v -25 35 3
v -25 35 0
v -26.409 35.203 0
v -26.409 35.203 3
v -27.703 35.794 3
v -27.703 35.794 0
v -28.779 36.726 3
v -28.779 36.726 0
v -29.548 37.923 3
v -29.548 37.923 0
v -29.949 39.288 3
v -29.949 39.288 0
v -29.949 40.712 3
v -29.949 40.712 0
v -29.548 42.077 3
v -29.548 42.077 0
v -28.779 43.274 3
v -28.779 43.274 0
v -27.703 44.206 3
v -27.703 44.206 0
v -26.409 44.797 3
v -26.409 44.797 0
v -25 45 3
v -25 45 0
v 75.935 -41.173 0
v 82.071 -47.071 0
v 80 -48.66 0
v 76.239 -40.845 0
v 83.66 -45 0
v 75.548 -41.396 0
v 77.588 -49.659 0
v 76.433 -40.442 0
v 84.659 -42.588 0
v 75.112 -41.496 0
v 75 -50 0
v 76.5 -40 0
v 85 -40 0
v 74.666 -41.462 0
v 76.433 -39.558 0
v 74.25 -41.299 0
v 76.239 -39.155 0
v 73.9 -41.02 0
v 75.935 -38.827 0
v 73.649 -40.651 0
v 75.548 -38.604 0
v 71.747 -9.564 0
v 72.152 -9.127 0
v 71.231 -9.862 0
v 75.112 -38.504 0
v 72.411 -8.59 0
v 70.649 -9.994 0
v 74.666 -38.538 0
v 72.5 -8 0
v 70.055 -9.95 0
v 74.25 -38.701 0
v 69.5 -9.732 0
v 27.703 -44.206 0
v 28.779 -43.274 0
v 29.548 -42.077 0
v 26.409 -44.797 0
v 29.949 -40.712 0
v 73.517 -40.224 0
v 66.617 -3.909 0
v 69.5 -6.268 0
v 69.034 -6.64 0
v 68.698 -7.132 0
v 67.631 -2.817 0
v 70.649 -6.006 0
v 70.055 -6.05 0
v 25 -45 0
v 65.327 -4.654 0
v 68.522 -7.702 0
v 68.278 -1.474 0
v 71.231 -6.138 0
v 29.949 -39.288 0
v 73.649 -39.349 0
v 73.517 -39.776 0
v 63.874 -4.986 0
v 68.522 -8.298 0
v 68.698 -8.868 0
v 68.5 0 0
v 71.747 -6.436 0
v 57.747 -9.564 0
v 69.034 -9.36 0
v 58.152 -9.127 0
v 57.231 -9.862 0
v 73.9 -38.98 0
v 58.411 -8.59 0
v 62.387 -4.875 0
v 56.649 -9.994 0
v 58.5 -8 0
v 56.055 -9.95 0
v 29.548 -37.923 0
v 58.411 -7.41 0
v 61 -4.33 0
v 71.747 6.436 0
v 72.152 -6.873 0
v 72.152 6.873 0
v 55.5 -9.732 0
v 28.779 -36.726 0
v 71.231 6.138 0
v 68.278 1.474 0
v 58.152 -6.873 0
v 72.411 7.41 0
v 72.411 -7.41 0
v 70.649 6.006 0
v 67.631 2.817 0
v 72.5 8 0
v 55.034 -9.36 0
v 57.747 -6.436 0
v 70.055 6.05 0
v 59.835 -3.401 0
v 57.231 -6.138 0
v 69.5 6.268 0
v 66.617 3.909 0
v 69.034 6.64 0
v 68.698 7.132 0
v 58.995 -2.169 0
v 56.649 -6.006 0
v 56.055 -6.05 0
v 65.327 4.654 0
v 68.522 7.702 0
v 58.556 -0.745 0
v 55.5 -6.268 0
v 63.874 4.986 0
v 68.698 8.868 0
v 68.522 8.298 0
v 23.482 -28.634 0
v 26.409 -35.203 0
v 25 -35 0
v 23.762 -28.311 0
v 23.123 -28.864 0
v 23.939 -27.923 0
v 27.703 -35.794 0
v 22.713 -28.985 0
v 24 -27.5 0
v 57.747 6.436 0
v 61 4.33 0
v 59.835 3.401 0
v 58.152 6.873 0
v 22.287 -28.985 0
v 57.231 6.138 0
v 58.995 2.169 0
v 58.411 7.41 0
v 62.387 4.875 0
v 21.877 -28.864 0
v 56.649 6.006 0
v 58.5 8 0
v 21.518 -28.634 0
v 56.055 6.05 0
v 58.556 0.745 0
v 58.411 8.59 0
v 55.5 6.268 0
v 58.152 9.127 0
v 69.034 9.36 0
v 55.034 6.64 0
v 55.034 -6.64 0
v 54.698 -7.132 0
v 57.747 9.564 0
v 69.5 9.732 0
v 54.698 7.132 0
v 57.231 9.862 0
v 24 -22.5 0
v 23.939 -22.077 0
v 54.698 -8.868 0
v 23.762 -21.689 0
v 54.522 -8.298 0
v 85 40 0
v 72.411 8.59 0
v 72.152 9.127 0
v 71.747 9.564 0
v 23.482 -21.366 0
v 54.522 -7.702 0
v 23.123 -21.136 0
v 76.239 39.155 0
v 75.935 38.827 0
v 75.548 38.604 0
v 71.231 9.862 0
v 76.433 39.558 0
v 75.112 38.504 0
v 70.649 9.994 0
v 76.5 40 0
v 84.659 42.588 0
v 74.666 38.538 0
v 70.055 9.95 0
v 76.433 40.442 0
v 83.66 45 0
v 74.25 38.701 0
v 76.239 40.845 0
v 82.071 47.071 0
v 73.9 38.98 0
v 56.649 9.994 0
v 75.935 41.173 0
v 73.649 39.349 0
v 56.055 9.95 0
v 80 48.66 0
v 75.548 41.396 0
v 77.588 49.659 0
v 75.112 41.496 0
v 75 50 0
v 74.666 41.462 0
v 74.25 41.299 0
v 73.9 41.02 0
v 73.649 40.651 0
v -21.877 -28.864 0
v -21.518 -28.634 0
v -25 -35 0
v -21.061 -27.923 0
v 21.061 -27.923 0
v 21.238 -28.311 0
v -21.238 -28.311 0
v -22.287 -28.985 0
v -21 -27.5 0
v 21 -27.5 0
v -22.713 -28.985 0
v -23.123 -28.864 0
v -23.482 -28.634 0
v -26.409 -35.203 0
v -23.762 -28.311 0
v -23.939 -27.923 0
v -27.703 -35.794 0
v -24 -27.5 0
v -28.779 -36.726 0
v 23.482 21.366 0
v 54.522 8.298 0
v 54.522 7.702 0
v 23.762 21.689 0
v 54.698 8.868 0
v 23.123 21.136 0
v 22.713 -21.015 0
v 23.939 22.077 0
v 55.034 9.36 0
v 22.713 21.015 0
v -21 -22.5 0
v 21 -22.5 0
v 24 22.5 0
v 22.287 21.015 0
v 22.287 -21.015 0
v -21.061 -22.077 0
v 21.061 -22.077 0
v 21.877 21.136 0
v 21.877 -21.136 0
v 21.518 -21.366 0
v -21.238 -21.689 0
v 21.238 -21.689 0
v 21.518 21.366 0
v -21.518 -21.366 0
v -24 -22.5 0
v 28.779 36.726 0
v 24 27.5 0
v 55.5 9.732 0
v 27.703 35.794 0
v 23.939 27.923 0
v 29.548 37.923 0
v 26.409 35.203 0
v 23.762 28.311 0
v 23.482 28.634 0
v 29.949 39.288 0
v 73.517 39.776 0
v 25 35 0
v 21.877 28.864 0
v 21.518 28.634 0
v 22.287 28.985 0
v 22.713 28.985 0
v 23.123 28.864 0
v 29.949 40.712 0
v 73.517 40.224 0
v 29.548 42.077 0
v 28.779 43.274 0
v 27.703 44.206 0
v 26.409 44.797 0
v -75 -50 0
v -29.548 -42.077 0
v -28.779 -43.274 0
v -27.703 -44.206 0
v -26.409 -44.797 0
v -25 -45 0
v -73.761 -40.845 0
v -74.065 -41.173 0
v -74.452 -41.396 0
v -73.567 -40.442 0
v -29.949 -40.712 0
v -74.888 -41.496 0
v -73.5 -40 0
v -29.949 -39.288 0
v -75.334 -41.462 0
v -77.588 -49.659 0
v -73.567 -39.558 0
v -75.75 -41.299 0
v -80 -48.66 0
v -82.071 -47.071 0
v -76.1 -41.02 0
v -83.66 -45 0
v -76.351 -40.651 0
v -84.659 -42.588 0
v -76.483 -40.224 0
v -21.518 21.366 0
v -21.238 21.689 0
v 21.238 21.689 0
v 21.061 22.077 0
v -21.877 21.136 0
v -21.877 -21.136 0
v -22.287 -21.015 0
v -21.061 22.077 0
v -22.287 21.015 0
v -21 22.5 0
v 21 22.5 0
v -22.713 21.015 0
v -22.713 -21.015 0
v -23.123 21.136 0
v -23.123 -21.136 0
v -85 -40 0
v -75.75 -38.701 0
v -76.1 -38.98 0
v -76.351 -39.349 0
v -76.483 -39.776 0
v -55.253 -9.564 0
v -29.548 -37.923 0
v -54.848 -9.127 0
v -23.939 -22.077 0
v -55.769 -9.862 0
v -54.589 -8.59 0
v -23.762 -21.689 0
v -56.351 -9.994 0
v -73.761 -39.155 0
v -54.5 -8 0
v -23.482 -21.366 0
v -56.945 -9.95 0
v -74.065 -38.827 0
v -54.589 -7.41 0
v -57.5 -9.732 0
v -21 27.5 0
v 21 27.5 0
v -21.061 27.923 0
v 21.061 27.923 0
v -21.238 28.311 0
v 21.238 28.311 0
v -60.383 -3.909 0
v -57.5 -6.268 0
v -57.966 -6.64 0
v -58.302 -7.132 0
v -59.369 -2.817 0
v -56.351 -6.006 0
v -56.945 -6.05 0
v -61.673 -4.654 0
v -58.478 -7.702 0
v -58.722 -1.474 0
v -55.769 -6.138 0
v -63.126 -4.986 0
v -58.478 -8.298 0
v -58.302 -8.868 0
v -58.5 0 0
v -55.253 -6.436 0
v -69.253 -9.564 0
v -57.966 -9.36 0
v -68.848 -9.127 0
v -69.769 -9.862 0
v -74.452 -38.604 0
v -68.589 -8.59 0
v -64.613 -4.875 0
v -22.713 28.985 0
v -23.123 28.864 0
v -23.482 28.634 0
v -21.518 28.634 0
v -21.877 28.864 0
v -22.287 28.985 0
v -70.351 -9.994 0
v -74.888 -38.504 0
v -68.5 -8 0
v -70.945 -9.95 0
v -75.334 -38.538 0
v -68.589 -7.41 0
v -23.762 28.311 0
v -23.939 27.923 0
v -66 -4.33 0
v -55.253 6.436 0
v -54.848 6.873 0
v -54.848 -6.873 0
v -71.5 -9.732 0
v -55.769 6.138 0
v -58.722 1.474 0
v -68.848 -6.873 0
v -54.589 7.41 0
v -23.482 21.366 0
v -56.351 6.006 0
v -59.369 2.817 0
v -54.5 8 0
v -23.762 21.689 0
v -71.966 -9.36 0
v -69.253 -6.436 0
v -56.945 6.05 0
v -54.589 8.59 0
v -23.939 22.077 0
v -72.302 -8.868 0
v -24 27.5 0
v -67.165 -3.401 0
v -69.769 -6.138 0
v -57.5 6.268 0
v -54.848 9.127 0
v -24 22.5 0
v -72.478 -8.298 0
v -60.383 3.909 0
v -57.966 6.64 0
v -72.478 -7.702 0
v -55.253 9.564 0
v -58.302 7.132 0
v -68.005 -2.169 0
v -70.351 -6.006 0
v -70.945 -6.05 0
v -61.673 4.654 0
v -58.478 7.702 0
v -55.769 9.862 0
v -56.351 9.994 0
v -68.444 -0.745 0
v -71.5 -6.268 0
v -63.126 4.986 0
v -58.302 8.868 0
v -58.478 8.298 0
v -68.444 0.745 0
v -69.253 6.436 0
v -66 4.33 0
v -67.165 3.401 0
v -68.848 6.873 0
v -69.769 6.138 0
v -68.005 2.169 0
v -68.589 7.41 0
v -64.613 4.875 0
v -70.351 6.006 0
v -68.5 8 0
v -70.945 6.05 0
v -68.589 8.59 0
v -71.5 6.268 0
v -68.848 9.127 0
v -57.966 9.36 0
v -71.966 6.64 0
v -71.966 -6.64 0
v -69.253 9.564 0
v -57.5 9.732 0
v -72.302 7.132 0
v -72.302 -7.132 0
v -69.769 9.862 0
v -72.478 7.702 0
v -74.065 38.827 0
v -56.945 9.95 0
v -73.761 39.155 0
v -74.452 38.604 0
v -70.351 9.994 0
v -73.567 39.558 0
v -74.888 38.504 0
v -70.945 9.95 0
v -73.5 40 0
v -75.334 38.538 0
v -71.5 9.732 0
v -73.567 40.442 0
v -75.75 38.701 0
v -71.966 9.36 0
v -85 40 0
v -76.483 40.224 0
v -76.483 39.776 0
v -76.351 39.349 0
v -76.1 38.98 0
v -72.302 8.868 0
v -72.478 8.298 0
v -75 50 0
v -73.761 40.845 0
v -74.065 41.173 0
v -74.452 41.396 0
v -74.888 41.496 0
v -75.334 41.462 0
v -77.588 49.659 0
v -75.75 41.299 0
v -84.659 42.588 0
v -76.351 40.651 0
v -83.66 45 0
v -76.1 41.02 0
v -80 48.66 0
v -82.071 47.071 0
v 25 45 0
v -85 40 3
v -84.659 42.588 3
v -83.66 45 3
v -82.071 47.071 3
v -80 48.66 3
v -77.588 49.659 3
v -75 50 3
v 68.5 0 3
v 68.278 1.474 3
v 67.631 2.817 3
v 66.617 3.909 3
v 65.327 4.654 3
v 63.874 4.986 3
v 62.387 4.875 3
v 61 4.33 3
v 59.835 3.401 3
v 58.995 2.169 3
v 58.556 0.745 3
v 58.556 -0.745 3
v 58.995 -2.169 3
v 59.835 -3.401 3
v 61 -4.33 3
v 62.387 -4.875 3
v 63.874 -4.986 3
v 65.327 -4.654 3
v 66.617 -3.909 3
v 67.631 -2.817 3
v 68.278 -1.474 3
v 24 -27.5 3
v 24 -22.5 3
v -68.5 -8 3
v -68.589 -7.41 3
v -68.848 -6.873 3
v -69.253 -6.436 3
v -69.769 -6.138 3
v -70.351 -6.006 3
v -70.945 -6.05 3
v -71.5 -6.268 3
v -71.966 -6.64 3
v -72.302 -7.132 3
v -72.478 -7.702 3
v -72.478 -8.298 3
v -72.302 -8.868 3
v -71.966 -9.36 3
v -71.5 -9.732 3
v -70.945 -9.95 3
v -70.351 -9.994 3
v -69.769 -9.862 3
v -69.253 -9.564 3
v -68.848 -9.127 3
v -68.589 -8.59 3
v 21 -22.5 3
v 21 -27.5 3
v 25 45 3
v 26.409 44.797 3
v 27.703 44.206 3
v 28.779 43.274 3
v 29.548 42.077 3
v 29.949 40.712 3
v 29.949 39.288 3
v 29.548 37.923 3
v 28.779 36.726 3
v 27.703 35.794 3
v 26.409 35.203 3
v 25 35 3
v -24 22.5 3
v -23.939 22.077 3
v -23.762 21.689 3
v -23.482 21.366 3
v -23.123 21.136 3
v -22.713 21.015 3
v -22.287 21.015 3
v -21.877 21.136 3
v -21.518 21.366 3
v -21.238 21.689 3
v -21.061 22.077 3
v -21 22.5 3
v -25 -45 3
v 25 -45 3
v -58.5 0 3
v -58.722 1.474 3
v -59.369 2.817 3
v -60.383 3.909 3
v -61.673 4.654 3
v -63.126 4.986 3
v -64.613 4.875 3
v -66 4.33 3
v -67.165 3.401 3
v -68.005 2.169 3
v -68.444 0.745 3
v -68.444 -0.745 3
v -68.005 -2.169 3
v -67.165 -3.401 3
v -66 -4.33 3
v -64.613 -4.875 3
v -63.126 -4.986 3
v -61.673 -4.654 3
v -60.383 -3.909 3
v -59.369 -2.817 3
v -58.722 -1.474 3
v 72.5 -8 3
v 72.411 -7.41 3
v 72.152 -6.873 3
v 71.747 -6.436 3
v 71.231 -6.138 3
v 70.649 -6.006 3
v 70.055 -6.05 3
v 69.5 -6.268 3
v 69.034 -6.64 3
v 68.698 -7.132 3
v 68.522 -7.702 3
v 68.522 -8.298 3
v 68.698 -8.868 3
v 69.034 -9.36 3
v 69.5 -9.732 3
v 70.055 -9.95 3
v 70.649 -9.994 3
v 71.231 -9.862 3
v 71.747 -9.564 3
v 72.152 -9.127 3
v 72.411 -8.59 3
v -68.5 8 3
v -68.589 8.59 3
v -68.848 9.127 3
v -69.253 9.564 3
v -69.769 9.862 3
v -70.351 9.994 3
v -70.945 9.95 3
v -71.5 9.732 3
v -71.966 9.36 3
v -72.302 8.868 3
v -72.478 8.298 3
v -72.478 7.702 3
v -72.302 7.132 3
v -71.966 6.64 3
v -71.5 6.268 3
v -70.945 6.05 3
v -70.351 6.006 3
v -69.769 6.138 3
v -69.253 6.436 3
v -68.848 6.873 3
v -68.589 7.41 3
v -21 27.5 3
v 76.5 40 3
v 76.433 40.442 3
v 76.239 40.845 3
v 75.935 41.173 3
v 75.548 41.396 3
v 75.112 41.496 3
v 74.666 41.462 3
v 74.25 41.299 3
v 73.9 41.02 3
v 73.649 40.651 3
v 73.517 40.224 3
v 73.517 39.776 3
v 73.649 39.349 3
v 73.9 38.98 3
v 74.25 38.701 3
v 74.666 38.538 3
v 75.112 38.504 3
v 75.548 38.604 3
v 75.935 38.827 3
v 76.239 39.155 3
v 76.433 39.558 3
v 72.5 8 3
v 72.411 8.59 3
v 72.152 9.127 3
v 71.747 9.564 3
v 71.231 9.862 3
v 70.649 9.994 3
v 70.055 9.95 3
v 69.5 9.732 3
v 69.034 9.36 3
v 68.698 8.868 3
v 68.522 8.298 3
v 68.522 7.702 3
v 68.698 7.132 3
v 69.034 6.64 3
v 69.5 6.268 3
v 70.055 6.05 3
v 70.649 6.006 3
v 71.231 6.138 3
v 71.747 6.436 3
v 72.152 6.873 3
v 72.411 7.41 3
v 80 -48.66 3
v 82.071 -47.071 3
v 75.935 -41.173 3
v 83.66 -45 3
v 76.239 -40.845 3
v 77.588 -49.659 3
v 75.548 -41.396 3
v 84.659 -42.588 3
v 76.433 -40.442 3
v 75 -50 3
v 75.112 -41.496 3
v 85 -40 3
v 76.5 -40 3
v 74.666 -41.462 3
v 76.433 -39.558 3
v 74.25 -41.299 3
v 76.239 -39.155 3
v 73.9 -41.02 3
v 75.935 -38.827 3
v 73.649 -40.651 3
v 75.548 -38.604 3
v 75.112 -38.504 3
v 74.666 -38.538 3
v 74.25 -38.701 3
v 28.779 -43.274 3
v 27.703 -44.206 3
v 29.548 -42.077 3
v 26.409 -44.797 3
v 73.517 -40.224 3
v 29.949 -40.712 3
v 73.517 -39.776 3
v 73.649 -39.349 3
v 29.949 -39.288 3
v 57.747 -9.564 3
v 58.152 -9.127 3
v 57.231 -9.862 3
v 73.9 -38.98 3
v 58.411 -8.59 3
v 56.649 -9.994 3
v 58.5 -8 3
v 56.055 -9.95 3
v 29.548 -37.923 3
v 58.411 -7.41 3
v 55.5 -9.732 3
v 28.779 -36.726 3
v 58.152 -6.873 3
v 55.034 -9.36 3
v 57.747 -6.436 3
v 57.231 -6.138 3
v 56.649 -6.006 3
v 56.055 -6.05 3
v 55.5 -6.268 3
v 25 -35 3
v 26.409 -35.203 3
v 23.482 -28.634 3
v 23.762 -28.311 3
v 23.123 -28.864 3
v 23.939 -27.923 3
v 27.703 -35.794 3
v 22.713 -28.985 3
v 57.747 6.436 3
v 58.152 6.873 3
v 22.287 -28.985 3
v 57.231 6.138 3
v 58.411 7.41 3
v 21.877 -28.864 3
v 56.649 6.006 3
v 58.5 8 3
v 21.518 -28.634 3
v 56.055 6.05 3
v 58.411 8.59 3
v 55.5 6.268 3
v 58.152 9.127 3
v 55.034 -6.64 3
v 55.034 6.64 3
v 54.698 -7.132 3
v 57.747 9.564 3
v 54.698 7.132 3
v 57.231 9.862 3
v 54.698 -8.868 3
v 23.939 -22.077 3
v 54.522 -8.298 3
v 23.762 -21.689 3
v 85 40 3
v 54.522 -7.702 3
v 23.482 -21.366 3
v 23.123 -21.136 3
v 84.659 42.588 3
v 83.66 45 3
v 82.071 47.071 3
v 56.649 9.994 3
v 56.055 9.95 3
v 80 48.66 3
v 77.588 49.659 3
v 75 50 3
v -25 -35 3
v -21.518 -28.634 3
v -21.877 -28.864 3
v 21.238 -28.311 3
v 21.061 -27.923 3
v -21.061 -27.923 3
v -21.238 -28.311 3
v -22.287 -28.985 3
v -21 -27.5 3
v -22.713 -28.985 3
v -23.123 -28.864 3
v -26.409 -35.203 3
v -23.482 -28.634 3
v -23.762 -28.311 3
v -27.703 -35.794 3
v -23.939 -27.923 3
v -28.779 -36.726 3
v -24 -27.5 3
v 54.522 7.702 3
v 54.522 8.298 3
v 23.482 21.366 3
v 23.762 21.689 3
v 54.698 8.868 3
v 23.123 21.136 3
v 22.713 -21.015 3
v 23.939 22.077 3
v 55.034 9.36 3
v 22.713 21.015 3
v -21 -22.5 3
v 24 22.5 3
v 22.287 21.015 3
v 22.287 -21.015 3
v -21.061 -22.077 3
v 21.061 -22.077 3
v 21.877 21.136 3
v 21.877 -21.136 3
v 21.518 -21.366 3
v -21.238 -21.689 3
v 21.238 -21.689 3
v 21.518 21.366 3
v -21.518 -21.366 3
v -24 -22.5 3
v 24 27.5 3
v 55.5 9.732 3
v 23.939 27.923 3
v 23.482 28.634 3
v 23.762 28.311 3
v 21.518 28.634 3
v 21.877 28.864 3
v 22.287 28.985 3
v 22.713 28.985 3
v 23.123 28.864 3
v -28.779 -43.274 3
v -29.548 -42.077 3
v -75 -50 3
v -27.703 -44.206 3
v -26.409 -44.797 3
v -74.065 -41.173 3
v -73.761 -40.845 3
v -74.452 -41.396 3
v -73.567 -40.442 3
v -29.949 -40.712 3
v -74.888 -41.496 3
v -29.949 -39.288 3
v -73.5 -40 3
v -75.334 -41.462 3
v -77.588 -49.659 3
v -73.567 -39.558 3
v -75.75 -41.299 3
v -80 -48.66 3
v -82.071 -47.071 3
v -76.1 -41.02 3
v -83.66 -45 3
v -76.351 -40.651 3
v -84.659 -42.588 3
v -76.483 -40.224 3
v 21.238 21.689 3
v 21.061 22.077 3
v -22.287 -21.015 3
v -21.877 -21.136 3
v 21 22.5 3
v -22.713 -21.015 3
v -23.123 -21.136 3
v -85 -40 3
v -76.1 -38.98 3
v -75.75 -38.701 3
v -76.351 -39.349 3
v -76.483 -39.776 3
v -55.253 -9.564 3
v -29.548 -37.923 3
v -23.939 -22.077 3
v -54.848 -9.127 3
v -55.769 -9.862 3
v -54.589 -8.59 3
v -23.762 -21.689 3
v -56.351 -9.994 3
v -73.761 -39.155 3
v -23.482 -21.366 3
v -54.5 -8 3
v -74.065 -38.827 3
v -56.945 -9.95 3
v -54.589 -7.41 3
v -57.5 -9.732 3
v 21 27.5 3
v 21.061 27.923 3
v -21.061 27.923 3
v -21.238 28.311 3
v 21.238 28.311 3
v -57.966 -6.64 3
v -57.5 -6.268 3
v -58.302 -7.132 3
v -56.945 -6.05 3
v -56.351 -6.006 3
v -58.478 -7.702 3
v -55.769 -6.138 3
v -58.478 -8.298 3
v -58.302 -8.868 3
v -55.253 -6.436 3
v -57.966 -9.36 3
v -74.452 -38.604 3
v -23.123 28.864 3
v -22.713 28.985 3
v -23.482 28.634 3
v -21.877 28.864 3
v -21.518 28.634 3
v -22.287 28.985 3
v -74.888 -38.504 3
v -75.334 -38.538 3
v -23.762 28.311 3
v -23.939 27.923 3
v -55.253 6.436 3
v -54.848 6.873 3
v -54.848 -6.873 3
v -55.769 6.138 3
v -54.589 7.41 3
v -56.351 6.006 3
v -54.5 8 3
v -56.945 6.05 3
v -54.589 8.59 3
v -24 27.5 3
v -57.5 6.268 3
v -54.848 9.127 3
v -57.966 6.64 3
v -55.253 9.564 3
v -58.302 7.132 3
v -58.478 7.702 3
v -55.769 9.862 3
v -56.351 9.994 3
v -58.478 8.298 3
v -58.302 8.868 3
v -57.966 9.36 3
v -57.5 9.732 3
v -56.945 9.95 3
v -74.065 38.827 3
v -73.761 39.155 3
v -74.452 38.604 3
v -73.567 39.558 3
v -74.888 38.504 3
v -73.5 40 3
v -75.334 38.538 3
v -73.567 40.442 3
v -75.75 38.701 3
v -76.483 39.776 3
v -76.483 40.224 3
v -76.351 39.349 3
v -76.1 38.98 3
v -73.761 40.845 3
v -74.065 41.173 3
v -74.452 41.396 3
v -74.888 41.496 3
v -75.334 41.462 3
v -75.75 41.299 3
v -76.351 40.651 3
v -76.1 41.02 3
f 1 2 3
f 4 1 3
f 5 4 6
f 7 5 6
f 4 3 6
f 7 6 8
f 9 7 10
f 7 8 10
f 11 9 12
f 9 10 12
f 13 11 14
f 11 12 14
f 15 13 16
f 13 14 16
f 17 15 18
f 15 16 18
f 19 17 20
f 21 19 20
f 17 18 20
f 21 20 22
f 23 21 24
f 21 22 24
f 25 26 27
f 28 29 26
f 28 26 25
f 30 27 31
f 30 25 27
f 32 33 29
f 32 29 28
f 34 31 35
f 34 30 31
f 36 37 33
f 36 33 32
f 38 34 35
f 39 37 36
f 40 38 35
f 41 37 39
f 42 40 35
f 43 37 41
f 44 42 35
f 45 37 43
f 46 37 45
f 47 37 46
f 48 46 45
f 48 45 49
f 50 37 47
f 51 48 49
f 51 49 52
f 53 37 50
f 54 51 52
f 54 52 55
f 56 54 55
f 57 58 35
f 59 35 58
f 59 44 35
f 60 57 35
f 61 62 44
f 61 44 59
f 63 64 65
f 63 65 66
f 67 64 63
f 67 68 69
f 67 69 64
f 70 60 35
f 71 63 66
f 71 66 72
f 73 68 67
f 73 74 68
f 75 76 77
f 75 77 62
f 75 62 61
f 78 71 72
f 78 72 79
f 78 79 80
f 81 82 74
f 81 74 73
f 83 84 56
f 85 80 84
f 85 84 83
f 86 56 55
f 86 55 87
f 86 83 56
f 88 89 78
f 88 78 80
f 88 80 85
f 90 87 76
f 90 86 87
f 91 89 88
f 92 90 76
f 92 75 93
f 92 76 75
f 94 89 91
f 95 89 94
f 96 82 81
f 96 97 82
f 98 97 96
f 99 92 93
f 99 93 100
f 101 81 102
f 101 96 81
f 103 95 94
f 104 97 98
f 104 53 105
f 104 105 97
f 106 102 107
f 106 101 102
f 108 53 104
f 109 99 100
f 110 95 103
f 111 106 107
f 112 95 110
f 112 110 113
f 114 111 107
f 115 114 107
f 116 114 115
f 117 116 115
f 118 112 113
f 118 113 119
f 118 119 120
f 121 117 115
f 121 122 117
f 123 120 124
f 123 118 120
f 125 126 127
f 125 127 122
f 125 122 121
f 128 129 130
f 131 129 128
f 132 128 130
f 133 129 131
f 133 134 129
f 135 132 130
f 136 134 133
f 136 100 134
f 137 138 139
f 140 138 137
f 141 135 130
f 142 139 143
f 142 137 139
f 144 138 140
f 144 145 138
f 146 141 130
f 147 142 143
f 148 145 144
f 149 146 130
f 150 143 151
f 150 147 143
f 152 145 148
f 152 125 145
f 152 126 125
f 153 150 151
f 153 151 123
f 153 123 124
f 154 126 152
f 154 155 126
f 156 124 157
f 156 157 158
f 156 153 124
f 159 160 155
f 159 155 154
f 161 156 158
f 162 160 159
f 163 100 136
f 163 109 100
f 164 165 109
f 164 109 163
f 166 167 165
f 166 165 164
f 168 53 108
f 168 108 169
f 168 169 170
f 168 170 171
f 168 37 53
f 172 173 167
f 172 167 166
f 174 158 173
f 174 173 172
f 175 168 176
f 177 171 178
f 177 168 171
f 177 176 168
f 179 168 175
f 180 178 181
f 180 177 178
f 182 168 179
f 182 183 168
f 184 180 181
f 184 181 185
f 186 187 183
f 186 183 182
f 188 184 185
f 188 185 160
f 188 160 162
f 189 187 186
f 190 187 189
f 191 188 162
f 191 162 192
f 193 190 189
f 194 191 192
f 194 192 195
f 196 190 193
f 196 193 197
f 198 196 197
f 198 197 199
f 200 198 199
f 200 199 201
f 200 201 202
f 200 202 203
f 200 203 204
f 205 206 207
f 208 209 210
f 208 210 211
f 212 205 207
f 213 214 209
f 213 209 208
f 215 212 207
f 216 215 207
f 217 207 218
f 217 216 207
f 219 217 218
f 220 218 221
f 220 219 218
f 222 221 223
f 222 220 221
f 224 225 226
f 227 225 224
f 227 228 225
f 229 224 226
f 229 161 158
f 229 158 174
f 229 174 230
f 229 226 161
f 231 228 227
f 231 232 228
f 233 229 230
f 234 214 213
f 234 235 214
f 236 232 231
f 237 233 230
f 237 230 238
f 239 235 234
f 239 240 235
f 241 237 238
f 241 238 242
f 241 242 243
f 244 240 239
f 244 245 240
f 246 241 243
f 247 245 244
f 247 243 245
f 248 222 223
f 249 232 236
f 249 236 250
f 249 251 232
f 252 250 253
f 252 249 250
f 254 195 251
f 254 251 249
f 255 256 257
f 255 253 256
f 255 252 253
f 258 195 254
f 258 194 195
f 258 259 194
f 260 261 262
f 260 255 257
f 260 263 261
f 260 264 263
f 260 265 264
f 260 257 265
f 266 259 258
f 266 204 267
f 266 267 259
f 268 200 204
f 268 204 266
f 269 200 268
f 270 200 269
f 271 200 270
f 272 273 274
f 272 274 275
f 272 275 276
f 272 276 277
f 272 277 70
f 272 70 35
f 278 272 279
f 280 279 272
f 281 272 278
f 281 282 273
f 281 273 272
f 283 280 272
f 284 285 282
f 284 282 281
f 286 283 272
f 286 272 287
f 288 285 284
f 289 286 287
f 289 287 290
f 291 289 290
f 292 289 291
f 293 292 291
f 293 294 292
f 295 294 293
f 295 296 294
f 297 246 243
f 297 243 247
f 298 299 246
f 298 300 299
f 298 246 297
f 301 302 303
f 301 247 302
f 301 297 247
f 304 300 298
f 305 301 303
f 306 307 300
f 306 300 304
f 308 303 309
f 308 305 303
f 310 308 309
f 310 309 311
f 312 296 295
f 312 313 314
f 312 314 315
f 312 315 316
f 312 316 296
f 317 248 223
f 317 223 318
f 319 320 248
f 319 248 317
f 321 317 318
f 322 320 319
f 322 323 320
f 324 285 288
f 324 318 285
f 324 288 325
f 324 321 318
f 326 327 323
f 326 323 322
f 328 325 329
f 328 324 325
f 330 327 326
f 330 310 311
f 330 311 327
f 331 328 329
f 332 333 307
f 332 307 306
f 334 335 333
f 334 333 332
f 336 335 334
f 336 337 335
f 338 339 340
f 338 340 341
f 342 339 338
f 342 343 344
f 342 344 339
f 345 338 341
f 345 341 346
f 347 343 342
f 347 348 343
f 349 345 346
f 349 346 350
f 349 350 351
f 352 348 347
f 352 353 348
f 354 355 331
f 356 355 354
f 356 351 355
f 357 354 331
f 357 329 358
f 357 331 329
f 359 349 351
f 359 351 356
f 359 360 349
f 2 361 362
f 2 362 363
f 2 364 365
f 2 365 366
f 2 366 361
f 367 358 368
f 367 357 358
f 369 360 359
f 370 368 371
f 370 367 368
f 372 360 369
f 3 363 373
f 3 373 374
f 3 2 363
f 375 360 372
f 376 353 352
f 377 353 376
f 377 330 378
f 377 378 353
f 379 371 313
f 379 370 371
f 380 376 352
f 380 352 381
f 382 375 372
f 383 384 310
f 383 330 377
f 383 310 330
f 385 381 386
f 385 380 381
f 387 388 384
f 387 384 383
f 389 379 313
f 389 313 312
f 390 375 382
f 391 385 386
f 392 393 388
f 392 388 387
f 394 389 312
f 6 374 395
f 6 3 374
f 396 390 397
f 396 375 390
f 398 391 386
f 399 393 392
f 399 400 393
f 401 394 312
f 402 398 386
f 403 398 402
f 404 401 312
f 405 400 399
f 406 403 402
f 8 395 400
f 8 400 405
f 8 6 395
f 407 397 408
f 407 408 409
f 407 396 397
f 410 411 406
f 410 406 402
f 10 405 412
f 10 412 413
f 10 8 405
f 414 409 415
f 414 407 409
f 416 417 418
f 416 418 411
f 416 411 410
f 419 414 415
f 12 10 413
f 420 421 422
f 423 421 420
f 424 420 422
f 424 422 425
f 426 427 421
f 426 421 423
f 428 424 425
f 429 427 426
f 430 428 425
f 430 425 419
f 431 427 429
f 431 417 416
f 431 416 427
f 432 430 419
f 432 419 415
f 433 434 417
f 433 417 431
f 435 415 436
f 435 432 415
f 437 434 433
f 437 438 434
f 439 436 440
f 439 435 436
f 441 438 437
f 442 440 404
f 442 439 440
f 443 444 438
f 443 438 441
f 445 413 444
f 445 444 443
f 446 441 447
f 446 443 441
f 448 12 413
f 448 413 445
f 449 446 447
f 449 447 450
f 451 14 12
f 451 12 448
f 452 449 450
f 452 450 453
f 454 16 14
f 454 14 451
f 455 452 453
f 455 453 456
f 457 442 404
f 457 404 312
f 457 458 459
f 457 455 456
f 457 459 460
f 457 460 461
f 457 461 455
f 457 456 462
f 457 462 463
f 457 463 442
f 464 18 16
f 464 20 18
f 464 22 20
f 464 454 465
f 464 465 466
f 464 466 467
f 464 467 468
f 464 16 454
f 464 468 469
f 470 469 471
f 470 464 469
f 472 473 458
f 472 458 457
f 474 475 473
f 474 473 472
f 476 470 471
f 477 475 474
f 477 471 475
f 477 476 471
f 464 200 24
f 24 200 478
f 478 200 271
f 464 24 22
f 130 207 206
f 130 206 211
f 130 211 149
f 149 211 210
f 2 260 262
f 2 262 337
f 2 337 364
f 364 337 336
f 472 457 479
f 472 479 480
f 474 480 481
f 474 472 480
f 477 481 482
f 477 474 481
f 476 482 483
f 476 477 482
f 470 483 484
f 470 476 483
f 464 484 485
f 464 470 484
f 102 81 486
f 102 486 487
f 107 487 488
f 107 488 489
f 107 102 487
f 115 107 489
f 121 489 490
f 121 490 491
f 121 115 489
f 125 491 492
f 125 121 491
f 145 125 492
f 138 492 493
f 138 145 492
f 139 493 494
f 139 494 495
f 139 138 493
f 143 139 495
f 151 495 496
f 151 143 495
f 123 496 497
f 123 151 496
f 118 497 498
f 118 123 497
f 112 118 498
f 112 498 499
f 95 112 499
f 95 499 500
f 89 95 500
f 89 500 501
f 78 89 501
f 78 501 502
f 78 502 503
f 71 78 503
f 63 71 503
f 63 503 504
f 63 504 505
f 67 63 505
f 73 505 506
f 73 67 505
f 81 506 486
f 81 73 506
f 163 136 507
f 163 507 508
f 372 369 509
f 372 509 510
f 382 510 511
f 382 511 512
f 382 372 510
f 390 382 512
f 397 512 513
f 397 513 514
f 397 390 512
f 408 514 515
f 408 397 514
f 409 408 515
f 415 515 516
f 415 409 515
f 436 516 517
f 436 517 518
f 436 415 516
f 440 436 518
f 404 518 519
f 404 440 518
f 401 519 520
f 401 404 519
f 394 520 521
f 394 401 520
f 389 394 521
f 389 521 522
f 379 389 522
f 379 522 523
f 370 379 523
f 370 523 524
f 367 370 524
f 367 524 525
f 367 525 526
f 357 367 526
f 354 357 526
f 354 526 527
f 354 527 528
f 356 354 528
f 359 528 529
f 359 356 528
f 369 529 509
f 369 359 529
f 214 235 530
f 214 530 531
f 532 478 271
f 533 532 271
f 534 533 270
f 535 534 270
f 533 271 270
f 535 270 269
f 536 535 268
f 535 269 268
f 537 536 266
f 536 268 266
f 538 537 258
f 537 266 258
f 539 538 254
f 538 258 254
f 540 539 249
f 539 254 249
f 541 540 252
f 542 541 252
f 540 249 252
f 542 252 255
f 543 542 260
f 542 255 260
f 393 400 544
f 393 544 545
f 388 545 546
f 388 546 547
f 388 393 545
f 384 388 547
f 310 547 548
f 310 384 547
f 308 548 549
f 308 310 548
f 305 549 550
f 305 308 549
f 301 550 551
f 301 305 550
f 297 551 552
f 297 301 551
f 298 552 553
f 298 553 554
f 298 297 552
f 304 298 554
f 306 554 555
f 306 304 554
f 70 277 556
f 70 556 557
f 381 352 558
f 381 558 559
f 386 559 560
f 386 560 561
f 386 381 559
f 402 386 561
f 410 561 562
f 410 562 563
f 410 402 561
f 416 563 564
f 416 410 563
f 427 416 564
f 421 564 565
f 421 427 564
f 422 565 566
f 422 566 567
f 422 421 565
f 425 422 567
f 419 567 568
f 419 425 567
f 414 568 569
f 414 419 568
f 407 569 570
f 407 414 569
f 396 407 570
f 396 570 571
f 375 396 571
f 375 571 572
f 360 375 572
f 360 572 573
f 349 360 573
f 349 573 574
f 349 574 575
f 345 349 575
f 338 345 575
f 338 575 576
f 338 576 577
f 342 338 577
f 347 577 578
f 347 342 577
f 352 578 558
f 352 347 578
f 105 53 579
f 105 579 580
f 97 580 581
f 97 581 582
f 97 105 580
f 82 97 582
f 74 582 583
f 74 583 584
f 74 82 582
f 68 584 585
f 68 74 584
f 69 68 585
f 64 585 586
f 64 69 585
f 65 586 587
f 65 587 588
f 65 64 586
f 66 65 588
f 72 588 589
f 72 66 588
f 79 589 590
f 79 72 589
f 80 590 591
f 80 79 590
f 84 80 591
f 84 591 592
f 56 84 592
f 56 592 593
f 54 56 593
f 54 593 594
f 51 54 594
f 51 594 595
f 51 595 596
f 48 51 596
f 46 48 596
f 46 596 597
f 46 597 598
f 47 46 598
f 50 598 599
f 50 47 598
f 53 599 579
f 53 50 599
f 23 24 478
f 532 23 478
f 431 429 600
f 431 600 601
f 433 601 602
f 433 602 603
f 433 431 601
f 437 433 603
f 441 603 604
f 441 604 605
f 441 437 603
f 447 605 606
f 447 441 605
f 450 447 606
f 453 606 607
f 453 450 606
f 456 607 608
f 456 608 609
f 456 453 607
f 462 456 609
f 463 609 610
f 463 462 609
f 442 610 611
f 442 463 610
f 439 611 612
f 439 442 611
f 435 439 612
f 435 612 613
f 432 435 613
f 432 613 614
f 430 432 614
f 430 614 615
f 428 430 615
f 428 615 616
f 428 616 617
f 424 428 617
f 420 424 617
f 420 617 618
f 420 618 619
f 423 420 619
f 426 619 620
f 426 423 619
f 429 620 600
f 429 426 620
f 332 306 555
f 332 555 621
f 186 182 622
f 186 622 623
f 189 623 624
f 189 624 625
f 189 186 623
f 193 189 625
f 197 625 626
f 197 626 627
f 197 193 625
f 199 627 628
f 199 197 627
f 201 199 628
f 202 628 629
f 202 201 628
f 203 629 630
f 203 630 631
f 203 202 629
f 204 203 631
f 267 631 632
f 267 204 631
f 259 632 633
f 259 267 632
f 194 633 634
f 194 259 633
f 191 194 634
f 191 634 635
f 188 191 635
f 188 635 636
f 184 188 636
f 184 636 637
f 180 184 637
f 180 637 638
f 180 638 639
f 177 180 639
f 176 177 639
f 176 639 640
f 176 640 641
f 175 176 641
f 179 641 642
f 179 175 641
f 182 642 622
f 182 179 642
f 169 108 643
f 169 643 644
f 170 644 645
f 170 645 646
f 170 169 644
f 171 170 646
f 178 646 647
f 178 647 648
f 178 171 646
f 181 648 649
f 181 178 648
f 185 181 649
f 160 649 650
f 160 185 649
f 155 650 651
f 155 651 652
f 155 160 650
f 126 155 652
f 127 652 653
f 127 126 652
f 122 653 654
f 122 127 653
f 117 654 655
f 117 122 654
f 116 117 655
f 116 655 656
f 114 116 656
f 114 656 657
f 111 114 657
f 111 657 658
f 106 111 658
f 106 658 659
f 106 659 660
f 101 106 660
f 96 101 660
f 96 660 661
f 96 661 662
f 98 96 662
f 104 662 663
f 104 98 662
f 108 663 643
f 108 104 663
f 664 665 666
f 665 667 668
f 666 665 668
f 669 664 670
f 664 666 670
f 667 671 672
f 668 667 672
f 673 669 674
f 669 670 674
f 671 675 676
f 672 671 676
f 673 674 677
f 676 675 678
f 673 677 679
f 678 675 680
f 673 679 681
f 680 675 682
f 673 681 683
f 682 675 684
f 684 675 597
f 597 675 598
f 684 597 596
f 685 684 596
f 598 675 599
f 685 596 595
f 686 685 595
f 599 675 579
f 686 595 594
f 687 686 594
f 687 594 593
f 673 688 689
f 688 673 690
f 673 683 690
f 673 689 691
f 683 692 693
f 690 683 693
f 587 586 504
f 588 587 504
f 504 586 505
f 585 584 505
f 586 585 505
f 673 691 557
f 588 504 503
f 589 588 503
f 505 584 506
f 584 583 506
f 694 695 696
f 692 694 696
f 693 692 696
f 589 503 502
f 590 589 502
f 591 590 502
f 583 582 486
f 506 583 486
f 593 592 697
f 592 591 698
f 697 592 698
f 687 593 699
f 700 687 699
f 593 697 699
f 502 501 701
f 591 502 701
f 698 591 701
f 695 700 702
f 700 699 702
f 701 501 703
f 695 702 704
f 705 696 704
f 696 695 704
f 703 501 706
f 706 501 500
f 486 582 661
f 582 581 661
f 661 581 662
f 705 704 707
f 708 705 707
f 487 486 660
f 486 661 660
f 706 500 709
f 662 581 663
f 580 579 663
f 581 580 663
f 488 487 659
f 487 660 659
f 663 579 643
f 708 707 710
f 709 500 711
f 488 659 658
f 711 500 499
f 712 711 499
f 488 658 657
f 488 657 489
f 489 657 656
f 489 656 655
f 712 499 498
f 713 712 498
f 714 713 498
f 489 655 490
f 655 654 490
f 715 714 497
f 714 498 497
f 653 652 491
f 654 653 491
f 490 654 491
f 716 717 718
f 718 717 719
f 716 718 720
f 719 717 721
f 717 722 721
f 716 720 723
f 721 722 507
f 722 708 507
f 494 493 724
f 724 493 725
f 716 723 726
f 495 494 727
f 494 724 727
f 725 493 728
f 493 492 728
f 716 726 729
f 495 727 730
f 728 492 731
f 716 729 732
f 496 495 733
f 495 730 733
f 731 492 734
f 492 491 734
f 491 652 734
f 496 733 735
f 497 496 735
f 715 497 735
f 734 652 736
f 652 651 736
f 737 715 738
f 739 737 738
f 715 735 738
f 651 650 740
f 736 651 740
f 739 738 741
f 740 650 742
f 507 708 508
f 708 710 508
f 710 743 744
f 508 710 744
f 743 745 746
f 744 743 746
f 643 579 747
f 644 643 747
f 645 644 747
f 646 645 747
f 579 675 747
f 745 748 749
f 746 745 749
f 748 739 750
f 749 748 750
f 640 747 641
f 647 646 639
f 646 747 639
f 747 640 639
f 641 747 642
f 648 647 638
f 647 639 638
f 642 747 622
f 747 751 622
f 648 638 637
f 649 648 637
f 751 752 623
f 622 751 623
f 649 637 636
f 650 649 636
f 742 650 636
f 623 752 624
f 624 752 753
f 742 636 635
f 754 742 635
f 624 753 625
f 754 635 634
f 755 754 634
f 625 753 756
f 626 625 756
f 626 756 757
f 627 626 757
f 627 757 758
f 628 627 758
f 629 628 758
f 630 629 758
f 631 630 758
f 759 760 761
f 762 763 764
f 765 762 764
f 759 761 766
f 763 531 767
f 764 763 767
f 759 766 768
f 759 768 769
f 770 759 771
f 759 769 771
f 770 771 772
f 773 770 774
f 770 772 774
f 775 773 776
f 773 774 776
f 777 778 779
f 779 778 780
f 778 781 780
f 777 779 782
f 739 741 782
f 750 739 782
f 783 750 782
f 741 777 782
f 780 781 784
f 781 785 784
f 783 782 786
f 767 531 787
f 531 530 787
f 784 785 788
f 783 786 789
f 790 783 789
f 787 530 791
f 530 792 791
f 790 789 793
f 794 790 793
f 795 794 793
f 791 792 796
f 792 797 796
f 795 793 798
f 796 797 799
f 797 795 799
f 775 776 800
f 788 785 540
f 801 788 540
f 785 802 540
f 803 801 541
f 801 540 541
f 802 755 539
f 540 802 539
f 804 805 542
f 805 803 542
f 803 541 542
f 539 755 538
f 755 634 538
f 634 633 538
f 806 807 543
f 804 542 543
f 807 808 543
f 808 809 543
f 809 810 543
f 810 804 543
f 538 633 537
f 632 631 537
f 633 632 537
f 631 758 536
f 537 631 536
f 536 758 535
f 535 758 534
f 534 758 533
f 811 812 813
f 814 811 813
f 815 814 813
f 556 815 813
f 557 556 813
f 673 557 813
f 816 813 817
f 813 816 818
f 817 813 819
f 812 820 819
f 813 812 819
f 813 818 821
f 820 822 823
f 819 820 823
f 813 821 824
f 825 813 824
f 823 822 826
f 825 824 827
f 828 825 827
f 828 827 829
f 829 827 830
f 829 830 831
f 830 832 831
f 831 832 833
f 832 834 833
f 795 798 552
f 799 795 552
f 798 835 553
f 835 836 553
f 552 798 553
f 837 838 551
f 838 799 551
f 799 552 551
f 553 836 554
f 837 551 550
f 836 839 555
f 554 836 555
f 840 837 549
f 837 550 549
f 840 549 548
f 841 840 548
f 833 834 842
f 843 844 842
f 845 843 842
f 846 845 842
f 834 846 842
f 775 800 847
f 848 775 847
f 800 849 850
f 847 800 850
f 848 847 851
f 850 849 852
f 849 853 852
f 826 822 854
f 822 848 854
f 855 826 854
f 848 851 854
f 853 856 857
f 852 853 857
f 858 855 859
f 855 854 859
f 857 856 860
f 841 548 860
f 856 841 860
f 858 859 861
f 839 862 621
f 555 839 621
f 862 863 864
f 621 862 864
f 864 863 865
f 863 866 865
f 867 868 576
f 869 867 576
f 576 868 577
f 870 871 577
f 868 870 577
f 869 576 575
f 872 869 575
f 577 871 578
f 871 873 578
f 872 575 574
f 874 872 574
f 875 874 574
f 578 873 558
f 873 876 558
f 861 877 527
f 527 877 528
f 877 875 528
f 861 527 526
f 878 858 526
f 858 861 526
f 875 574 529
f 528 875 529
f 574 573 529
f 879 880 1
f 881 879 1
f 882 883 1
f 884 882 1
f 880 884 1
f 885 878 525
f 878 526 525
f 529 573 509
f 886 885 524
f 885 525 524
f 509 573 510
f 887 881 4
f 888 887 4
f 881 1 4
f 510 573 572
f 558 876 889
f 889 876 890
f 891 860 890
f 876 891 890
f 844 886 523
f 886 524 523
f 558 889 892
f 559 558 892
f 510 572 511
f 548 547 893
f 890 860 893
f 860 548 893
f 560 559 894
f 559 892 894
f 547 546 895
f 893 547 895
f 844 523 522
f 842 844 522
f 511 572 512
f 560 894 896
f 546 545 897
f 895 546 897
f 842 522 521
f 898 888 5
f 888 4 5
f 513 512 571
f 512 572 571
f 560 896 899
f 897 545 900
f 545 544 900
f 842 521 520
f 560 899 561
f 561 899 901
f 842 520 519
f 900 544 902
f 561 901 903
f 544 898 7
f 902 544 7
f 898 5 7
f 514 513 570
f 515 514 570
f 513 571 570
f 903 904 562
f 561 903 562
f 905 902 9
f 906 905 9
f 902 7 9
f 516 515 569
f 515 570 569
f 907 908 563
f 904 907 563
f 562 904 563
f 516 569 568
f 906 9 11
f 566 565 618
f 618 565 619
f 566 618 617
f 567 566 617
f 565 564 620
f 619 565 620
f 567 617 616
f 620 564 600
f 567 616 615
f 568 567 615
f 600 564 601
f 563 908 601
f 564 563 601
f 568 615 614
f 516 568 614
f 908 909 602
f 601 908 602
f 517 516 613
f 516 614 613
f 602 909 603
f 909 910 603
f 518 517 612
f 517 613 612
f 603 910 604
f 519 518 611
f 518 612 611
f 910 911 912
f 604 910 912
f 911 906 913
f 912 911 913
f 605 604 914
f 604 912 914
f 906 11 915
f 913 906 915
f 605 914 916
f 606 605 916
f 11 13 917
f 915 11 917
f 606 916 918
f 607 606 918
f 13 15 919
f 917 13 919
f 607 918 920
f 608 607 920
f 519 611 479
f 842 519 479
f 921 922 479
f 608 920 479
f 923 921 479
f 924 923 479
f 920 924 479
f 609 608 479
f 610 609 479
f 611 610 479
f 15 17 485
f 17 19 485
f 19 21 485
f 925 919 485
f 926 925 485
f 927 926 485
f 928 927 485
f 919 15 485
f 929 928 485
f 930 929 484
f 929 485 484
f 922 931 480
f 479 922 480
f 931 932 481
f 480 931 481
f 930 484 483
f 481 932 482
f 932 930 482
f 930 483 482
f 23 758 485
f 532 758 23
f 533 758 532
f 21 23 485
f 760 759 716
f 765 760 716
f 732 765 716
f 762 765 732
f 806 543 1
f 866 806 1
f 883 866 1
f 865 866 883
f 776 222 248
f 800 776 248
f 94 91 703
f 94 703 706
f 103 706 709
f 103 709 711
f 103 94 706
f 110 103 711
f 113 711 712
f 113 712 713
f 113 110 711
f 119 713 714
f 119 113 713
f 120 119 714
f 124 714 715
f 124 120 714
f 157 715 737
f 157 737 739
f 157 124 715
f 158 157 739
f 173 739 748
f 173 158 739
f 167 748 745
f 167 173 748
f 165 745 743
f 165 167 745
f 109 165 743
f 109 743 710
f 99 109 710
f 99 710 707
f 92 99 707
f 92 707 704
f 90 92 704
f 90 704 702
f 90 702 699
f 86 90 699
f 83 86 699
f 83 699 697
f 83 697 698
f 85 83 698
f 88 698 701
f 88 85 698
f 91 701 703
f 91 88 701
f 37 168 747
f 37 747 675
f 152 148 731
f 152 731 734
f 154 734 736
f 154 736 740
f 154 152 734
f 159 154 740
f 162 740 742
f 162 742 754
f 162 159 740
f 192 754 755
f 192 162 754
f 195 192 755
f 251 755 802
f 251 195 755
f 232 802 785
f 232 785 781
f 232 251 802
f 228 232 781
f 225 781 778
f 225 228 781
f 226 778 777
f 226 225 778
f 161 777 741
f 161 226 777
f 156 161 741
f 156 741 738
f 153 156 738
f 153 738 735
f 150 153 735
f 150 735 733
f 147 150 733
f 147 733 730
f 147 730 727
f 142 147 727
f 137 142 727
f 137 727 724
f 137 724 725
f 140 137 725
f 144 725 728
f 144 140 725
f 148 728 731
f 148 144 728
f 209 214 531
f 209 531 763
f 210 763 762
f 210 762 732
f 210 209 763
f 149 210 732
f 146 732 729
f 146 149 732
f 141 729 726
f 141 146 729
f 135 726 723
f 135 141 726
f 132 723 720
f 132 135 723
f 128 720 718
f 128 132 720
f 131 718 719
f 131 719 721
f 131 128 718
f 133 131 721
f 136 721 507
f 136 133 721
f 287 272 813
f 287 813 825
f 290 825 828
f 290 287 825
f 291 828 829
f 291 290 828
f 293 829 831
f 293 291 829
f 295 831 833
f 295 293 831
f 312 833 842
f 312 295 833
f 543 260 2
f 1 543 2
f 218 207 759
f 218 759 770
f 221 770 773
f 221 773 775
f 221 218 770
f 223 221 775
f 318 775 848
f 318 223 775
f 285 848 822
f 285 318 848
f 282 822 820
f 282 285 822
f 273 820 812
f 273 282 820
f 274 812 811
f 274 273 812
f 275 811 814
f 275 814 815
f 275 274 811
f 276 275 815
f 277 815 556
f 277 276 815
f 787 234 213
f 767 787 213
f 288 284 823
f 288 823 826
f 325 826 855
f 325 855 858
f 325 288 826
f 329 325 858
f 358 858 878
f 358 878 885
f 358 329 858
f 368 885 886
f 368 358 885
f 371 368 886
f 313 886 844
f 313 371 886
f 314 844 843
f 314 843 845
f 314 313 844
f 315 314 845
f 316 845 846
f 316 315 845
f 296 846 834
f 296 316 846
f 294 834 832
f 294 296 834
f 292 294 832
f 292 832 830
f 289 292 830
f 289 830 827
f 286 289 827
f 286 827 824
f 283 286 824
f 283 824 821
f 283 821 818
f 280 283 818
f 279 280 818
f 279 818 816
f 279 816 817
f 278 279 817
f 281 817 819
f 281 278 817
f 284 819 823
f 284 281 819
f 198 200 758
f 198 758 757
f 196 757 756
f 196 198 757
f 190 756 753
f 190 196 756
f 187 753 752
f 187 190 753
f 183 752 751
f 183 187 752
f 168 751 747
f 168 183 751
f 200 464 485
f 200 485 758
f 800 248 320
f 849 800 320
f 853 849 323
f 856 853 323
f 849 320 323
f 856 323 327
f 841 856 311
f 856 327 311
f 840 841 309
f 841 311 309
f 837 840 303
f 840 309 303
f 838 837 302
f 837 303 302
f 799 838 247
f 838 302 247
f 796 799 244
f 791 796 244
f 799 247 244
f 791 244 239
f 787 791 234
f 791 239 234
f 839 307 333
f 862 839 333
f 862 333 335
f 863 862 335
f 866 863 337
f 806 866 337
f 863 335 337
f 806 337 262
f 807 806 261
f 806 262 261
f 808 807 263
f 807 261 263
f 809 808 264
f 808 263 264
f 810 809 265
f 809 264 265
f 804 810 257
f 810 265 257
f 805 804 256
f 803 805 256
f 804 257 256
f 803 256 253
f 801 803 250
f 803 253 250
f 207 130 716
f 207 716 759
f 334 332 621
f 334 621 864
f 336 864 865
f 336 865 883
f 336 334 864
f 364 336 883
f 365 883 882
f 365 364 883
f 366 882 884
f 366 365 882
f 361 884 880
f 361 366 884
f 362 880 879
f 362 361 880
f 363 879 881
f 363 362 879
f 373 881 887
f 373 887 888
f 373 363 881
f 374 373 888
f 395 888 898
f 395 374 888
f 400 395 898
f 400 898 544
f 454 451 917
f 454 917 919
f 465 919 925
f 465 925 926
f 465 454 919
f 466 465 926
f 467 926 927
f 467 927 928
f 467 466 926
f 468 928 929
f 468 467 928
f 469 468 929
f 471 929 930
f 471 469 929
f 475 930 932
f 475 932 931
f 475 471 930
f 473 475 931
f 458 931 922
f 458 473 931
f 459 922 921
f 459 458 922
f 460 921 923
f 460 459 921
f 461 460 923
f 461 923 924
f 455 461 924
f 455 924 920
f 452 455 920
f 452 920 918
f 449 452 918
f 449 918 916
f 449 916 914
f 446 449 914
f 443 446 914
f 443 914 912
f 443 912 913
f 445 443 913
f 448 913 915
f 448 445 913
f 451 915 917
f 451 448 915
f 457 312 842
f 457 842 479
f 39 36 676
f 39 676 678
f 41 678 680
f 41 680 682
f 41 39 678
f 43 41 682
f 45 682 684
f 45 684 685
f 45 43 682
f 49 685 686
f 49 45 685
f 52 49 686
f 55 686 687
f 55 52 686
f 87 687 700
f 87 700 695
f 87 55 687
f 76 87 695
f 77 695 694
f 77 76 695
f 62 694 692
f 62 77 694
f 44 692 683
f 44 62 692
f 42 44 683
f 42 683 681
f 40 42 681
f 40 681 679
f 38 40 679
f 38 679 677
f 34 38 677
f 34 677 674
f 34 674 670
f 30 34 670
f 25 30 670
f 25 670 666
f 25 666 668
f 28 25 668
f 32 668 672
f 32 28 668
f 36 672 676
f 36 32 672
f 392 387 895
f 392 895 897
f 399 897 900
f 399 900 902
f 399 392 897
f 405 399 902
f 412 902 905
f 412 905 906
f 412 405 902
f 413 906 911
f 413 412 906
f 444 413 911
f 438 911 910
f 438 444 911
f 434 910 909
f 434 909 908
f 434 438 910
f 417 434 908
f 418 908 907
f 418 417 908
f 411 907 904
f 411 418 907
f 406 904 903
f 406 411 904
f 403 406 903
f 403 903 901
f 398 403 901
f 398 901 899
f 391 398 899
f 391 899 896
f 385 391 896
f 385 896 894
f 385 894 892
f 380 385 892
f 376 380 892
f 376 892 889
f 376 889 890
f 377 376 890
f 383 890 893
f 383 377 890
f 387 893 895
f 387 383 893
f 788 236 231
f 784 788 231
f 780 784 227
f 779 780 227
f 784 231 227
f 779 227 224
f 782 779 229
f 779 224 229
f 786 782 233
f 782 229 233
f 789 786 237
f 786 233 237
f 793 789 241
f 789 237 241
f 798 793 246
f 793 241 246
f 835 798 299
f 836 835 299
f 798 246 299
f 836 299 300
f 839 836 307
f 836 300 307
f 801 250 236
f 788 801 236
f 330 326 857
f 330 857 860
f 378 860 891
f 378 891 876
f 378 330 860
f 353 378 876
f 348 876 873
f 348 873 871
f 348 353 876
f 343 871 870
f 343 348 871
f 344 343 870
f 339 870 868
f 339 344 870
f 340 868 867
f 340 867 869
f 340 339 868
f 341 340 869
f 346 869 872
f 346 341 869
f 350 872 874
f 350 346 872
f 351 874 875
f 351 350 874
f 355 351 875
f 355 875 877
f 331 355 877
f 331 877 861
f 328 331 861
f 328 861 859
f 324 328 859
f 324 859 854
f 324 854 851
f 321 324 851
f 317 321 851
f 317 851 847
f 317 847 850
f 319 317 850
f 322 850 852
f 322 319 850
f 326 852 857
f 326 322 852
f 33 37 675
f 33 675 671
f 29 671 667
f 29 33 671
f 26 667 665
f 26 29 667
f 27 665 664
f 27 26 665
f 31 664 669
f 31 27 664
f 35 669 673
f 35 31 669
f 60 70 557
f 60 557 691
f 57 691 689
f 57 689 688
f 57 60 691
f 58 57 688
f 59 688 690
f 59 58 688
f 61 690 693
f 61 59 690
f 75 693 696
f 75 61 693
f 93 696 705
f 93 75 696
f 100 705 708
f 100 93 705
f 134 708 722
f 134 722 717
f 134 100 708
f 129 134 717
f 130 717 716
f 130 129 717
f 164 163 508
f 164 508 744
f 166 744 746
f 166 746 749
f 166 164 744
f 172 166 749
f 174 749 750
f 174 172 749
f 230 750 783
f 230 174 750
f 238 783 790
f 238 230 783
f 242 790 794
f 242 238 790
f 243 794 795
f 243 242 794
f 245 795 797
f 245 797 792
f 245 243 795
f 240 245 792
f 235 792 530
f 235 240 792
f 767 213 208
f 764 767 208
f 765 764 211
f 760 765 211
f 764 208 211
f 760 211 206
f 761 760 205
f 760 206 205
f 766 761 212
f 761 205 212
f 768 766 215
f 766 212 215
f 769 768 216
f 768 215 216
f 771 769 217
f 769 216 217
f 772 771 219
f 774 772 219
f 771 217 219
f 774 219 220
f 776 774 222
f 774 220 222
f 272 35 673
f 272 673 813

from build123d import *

# Parameters (mm, degrees)
SKETCH1_R           = 2
SKETCH1_R_2         = 1.5
SKETCH1_R_3         = 5
BOSS_EXTRUDE1_DEPTH = 3


with BuildPart() as part:
    # Sketch1 → Boss-Extrude1 (new body)
    with BuildSketch(Plane.XY):
        with BuildLine():
            Line((-75, 50), (75, 50))
            ThreePointArc((75, 50), (82.071067812, 47.071067812), (85, 40))
            Line((85, 40), (85, -40))
            ThreePointArc((85, -40), (82.071067812, -47.071067812), (75, -50))
            Line((75, -50), (-75, -50))
            ThreePointArc((-75, -50), (-82.071067812, -47.071067812), (-85, -40))
            Line((-85, -40), (-85, 40))
            ThreePointArc((-85, 40), (-82.071067812, 47.071067812), (-75, 50))
        make_face()
        with Locations((-70.5, 8)):
            Circle(SKETCH1_R, mode=Mode.SUBTRACT)
        with Locations((-70.5, -8)):
            Circle(SKETCH1_R, mode=Mode.SUBTRACT)
        with Locations((-56.5, -8)):
            Circle(SKETCH1_R, mode=Mode.SUBTRACT)
        with Locations((-56.5, 8)):
            Circle(SKETCH1_R, mode=Mode.SUBTRACT)
        with Locations((70.5, -8)):
            Circle(SKETCH1_R, mode=Mode.SUBTRACT)
        with Locations((56.5, -8)):
            Circle(SKETCH1_R, mode=Mode.SUBTRACT)
        with Locations((56.5, 8)):
            Circle(SKETCH1_R, mode=Mode.SUBTRACT)
        with Locations((70.5, 8)):
            Circle(SKETCH1_R, mode=Mode.SUBTRACT)
        with Locations((-75, -40)):
            Circle(SKETCH1_R_2, mode=Mode.SUBTRACT)
        with Locations((-75, 40)):
            Circle(SKETCH1_R_2, mode=Mode.SUBTRACT)
        with Locations((75, 40)):
            Circle(SKETCH1_R_2, mode=Mode.SUBTRACT)
        with Locations((75, -40)):
            Circle(SKETCH1_R_2, mode=Mode.SUBTRACT)
        with Locations((-63.5, 0)):
            Circle(SKETCH1_R_3, mode=Mode.SUBTRACT)
        with Locations((63.5, 0)):
            Circle(SKETCH1_R_3, mode=Mode.SUBTRACT)
        with BuildLine():
            Line((-25, 45), (25, 45))
            ThreePointArc((25, 45), (30, 40), (25, 35))
            Line((25, 35), (-25, 35))
            ThreePointArc((-25, 35), (-30, 40), (-25, 45))
        make_face(mode=Mode.SUBTRACT)
        with BuildLine():
            Line((-25, -45), (25, -45))
            ThreePointArc((25, -45), (30, -40), (25, -35))
            Line((25, -35), (-25, -35))
            ThreePointArc((-25, -35), (-30, -40), (-25, -45))
        make_face(mode=Mode.SUBTRACT)
        with BuildLine():
            Line((-24, -27.5), (-24, -22.5))
            ThreePointArc((-24, -22.5), (-22.5, -21), (-21, -22.5))
            Line((-21, -22.5), (-21, -27.5))
            ThreePointArc((-21, -27.5), (-22.5, -29), (-24, -27.5))
        make_face(mode=Mode.SUBTRACT)
        with BuildLine():
            Line((-24, 27.5), (-24, 22.5))
            ThreePointArc((-24, 22.5), (-22.5, 21), (-21, 22.5))
            Line((-21, 22.5), (-21, 27.5))
            ThreePointArc((-21, 27.5), (-22.5, 29), (-24, 27.5))
        make_face(mode=Mode.SUBTRACT)
        with BuildLine():
            Line((24, 27.5), (24, 22.5))
            ThreePointArc((24, 22.5), (22.5, 21), (21, 22.5))
            Line((21, 22.5), (21, 27.5))
            ThreePointArc((21, 27.5), (22.5, 29), (24, 27.5))
        make_face(mode=Mode.SUBTRACT)
        with BuildLine():
            Line((24, -27.5), (24, -22.5))
            ThreePointArc((24, -22.5), (22.5, -21), (21, -22.5))
            Line((21, -22.5), (21, -27.5))
            ThreePointArc((21, -27.5), (22.5, -29), (24, -27.5))
        make_face(mode=Mode.SUBTRACT)
    extrude(amount=BOSS_EXTRUDE1_DEPTH)


solid = part.part
